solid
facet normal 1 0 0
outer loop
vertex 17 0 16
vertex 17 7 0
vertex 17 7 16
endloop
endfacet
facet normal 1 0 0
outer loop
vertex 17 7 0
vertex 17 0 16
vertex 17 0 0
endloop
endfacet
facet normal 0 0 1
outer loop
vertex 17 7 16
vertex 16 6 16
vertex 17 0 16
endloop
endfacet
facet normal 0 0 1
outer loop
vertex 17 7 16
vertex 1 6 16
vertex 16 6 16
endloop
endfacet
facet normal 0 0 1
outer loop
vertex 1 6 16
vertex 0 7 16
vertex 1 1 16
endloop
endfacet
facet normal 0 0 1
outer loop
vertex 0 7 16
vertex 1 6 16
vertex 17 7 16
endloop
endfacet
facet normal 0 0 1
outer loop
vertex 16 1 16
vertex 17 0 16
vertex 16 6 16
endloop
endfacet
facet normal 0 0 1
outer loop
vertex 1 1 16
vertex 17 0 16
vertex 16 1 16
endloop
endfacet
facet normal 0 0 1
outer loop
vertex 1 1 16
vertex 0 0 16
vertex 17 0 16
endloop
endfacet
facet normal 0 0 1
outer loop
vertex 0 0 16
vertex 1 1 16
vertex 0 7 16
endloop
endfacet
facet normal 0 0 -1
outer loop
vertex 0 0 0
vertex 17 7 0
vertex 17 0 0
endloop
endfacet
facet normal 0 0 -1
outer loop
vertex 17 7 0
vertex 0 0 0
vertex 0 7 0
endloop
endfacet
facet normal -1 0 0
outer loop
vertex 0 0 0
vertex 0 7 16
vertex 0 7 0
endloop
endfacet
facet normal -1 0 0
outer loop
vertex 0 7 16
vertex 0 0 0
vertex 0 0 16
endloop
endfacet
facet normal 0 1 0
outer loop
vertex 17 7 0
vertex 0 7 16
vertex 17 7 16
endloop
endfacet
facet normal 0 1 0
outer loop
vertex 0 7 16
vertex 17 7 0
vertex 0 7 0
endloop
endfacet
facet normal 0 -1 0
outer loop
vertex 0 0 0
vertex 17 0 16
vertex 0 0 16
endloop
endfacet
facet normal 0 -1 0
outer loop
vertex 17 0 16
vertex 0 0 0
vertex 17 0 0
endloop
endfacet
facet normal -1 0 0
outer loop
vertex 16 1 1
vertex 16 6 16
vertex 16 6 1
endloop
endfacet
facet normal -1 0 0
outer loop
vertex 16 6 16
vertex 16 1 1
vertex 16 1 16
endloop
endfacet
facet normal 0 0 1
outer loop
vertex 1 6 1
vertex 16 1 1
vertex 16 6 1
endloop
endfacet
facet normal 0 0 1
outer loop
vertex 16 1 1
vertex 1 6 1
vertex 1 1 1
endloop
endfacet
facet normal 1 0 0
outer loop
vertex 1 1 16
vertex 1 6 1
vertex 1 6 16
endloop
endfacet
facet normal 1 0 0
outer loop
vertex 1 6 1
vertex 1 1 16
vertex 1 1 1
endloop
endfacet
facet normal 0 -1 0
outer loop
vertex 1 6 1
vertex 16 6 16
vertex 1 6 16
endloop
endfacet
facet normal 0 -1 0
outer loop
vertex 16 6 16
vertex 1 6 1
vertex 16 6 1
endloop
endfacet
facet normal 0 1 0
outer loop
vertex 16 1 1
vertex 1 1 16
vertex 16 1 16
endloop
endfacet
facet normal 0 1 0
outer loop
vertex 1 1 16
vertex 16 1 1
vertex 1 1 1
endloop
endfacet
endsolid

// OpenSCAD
width = 15;
depth = 5;
height = 15;

thickness = 1;

difference()
{
    cube([
            width+thickness*2, 
            depth+thickness*2,
            height+thickness
          ]);
    translate([thickness,thickness,thickness])
    cube([
        width, 
        depth,
        height+.1
      ]);
}
